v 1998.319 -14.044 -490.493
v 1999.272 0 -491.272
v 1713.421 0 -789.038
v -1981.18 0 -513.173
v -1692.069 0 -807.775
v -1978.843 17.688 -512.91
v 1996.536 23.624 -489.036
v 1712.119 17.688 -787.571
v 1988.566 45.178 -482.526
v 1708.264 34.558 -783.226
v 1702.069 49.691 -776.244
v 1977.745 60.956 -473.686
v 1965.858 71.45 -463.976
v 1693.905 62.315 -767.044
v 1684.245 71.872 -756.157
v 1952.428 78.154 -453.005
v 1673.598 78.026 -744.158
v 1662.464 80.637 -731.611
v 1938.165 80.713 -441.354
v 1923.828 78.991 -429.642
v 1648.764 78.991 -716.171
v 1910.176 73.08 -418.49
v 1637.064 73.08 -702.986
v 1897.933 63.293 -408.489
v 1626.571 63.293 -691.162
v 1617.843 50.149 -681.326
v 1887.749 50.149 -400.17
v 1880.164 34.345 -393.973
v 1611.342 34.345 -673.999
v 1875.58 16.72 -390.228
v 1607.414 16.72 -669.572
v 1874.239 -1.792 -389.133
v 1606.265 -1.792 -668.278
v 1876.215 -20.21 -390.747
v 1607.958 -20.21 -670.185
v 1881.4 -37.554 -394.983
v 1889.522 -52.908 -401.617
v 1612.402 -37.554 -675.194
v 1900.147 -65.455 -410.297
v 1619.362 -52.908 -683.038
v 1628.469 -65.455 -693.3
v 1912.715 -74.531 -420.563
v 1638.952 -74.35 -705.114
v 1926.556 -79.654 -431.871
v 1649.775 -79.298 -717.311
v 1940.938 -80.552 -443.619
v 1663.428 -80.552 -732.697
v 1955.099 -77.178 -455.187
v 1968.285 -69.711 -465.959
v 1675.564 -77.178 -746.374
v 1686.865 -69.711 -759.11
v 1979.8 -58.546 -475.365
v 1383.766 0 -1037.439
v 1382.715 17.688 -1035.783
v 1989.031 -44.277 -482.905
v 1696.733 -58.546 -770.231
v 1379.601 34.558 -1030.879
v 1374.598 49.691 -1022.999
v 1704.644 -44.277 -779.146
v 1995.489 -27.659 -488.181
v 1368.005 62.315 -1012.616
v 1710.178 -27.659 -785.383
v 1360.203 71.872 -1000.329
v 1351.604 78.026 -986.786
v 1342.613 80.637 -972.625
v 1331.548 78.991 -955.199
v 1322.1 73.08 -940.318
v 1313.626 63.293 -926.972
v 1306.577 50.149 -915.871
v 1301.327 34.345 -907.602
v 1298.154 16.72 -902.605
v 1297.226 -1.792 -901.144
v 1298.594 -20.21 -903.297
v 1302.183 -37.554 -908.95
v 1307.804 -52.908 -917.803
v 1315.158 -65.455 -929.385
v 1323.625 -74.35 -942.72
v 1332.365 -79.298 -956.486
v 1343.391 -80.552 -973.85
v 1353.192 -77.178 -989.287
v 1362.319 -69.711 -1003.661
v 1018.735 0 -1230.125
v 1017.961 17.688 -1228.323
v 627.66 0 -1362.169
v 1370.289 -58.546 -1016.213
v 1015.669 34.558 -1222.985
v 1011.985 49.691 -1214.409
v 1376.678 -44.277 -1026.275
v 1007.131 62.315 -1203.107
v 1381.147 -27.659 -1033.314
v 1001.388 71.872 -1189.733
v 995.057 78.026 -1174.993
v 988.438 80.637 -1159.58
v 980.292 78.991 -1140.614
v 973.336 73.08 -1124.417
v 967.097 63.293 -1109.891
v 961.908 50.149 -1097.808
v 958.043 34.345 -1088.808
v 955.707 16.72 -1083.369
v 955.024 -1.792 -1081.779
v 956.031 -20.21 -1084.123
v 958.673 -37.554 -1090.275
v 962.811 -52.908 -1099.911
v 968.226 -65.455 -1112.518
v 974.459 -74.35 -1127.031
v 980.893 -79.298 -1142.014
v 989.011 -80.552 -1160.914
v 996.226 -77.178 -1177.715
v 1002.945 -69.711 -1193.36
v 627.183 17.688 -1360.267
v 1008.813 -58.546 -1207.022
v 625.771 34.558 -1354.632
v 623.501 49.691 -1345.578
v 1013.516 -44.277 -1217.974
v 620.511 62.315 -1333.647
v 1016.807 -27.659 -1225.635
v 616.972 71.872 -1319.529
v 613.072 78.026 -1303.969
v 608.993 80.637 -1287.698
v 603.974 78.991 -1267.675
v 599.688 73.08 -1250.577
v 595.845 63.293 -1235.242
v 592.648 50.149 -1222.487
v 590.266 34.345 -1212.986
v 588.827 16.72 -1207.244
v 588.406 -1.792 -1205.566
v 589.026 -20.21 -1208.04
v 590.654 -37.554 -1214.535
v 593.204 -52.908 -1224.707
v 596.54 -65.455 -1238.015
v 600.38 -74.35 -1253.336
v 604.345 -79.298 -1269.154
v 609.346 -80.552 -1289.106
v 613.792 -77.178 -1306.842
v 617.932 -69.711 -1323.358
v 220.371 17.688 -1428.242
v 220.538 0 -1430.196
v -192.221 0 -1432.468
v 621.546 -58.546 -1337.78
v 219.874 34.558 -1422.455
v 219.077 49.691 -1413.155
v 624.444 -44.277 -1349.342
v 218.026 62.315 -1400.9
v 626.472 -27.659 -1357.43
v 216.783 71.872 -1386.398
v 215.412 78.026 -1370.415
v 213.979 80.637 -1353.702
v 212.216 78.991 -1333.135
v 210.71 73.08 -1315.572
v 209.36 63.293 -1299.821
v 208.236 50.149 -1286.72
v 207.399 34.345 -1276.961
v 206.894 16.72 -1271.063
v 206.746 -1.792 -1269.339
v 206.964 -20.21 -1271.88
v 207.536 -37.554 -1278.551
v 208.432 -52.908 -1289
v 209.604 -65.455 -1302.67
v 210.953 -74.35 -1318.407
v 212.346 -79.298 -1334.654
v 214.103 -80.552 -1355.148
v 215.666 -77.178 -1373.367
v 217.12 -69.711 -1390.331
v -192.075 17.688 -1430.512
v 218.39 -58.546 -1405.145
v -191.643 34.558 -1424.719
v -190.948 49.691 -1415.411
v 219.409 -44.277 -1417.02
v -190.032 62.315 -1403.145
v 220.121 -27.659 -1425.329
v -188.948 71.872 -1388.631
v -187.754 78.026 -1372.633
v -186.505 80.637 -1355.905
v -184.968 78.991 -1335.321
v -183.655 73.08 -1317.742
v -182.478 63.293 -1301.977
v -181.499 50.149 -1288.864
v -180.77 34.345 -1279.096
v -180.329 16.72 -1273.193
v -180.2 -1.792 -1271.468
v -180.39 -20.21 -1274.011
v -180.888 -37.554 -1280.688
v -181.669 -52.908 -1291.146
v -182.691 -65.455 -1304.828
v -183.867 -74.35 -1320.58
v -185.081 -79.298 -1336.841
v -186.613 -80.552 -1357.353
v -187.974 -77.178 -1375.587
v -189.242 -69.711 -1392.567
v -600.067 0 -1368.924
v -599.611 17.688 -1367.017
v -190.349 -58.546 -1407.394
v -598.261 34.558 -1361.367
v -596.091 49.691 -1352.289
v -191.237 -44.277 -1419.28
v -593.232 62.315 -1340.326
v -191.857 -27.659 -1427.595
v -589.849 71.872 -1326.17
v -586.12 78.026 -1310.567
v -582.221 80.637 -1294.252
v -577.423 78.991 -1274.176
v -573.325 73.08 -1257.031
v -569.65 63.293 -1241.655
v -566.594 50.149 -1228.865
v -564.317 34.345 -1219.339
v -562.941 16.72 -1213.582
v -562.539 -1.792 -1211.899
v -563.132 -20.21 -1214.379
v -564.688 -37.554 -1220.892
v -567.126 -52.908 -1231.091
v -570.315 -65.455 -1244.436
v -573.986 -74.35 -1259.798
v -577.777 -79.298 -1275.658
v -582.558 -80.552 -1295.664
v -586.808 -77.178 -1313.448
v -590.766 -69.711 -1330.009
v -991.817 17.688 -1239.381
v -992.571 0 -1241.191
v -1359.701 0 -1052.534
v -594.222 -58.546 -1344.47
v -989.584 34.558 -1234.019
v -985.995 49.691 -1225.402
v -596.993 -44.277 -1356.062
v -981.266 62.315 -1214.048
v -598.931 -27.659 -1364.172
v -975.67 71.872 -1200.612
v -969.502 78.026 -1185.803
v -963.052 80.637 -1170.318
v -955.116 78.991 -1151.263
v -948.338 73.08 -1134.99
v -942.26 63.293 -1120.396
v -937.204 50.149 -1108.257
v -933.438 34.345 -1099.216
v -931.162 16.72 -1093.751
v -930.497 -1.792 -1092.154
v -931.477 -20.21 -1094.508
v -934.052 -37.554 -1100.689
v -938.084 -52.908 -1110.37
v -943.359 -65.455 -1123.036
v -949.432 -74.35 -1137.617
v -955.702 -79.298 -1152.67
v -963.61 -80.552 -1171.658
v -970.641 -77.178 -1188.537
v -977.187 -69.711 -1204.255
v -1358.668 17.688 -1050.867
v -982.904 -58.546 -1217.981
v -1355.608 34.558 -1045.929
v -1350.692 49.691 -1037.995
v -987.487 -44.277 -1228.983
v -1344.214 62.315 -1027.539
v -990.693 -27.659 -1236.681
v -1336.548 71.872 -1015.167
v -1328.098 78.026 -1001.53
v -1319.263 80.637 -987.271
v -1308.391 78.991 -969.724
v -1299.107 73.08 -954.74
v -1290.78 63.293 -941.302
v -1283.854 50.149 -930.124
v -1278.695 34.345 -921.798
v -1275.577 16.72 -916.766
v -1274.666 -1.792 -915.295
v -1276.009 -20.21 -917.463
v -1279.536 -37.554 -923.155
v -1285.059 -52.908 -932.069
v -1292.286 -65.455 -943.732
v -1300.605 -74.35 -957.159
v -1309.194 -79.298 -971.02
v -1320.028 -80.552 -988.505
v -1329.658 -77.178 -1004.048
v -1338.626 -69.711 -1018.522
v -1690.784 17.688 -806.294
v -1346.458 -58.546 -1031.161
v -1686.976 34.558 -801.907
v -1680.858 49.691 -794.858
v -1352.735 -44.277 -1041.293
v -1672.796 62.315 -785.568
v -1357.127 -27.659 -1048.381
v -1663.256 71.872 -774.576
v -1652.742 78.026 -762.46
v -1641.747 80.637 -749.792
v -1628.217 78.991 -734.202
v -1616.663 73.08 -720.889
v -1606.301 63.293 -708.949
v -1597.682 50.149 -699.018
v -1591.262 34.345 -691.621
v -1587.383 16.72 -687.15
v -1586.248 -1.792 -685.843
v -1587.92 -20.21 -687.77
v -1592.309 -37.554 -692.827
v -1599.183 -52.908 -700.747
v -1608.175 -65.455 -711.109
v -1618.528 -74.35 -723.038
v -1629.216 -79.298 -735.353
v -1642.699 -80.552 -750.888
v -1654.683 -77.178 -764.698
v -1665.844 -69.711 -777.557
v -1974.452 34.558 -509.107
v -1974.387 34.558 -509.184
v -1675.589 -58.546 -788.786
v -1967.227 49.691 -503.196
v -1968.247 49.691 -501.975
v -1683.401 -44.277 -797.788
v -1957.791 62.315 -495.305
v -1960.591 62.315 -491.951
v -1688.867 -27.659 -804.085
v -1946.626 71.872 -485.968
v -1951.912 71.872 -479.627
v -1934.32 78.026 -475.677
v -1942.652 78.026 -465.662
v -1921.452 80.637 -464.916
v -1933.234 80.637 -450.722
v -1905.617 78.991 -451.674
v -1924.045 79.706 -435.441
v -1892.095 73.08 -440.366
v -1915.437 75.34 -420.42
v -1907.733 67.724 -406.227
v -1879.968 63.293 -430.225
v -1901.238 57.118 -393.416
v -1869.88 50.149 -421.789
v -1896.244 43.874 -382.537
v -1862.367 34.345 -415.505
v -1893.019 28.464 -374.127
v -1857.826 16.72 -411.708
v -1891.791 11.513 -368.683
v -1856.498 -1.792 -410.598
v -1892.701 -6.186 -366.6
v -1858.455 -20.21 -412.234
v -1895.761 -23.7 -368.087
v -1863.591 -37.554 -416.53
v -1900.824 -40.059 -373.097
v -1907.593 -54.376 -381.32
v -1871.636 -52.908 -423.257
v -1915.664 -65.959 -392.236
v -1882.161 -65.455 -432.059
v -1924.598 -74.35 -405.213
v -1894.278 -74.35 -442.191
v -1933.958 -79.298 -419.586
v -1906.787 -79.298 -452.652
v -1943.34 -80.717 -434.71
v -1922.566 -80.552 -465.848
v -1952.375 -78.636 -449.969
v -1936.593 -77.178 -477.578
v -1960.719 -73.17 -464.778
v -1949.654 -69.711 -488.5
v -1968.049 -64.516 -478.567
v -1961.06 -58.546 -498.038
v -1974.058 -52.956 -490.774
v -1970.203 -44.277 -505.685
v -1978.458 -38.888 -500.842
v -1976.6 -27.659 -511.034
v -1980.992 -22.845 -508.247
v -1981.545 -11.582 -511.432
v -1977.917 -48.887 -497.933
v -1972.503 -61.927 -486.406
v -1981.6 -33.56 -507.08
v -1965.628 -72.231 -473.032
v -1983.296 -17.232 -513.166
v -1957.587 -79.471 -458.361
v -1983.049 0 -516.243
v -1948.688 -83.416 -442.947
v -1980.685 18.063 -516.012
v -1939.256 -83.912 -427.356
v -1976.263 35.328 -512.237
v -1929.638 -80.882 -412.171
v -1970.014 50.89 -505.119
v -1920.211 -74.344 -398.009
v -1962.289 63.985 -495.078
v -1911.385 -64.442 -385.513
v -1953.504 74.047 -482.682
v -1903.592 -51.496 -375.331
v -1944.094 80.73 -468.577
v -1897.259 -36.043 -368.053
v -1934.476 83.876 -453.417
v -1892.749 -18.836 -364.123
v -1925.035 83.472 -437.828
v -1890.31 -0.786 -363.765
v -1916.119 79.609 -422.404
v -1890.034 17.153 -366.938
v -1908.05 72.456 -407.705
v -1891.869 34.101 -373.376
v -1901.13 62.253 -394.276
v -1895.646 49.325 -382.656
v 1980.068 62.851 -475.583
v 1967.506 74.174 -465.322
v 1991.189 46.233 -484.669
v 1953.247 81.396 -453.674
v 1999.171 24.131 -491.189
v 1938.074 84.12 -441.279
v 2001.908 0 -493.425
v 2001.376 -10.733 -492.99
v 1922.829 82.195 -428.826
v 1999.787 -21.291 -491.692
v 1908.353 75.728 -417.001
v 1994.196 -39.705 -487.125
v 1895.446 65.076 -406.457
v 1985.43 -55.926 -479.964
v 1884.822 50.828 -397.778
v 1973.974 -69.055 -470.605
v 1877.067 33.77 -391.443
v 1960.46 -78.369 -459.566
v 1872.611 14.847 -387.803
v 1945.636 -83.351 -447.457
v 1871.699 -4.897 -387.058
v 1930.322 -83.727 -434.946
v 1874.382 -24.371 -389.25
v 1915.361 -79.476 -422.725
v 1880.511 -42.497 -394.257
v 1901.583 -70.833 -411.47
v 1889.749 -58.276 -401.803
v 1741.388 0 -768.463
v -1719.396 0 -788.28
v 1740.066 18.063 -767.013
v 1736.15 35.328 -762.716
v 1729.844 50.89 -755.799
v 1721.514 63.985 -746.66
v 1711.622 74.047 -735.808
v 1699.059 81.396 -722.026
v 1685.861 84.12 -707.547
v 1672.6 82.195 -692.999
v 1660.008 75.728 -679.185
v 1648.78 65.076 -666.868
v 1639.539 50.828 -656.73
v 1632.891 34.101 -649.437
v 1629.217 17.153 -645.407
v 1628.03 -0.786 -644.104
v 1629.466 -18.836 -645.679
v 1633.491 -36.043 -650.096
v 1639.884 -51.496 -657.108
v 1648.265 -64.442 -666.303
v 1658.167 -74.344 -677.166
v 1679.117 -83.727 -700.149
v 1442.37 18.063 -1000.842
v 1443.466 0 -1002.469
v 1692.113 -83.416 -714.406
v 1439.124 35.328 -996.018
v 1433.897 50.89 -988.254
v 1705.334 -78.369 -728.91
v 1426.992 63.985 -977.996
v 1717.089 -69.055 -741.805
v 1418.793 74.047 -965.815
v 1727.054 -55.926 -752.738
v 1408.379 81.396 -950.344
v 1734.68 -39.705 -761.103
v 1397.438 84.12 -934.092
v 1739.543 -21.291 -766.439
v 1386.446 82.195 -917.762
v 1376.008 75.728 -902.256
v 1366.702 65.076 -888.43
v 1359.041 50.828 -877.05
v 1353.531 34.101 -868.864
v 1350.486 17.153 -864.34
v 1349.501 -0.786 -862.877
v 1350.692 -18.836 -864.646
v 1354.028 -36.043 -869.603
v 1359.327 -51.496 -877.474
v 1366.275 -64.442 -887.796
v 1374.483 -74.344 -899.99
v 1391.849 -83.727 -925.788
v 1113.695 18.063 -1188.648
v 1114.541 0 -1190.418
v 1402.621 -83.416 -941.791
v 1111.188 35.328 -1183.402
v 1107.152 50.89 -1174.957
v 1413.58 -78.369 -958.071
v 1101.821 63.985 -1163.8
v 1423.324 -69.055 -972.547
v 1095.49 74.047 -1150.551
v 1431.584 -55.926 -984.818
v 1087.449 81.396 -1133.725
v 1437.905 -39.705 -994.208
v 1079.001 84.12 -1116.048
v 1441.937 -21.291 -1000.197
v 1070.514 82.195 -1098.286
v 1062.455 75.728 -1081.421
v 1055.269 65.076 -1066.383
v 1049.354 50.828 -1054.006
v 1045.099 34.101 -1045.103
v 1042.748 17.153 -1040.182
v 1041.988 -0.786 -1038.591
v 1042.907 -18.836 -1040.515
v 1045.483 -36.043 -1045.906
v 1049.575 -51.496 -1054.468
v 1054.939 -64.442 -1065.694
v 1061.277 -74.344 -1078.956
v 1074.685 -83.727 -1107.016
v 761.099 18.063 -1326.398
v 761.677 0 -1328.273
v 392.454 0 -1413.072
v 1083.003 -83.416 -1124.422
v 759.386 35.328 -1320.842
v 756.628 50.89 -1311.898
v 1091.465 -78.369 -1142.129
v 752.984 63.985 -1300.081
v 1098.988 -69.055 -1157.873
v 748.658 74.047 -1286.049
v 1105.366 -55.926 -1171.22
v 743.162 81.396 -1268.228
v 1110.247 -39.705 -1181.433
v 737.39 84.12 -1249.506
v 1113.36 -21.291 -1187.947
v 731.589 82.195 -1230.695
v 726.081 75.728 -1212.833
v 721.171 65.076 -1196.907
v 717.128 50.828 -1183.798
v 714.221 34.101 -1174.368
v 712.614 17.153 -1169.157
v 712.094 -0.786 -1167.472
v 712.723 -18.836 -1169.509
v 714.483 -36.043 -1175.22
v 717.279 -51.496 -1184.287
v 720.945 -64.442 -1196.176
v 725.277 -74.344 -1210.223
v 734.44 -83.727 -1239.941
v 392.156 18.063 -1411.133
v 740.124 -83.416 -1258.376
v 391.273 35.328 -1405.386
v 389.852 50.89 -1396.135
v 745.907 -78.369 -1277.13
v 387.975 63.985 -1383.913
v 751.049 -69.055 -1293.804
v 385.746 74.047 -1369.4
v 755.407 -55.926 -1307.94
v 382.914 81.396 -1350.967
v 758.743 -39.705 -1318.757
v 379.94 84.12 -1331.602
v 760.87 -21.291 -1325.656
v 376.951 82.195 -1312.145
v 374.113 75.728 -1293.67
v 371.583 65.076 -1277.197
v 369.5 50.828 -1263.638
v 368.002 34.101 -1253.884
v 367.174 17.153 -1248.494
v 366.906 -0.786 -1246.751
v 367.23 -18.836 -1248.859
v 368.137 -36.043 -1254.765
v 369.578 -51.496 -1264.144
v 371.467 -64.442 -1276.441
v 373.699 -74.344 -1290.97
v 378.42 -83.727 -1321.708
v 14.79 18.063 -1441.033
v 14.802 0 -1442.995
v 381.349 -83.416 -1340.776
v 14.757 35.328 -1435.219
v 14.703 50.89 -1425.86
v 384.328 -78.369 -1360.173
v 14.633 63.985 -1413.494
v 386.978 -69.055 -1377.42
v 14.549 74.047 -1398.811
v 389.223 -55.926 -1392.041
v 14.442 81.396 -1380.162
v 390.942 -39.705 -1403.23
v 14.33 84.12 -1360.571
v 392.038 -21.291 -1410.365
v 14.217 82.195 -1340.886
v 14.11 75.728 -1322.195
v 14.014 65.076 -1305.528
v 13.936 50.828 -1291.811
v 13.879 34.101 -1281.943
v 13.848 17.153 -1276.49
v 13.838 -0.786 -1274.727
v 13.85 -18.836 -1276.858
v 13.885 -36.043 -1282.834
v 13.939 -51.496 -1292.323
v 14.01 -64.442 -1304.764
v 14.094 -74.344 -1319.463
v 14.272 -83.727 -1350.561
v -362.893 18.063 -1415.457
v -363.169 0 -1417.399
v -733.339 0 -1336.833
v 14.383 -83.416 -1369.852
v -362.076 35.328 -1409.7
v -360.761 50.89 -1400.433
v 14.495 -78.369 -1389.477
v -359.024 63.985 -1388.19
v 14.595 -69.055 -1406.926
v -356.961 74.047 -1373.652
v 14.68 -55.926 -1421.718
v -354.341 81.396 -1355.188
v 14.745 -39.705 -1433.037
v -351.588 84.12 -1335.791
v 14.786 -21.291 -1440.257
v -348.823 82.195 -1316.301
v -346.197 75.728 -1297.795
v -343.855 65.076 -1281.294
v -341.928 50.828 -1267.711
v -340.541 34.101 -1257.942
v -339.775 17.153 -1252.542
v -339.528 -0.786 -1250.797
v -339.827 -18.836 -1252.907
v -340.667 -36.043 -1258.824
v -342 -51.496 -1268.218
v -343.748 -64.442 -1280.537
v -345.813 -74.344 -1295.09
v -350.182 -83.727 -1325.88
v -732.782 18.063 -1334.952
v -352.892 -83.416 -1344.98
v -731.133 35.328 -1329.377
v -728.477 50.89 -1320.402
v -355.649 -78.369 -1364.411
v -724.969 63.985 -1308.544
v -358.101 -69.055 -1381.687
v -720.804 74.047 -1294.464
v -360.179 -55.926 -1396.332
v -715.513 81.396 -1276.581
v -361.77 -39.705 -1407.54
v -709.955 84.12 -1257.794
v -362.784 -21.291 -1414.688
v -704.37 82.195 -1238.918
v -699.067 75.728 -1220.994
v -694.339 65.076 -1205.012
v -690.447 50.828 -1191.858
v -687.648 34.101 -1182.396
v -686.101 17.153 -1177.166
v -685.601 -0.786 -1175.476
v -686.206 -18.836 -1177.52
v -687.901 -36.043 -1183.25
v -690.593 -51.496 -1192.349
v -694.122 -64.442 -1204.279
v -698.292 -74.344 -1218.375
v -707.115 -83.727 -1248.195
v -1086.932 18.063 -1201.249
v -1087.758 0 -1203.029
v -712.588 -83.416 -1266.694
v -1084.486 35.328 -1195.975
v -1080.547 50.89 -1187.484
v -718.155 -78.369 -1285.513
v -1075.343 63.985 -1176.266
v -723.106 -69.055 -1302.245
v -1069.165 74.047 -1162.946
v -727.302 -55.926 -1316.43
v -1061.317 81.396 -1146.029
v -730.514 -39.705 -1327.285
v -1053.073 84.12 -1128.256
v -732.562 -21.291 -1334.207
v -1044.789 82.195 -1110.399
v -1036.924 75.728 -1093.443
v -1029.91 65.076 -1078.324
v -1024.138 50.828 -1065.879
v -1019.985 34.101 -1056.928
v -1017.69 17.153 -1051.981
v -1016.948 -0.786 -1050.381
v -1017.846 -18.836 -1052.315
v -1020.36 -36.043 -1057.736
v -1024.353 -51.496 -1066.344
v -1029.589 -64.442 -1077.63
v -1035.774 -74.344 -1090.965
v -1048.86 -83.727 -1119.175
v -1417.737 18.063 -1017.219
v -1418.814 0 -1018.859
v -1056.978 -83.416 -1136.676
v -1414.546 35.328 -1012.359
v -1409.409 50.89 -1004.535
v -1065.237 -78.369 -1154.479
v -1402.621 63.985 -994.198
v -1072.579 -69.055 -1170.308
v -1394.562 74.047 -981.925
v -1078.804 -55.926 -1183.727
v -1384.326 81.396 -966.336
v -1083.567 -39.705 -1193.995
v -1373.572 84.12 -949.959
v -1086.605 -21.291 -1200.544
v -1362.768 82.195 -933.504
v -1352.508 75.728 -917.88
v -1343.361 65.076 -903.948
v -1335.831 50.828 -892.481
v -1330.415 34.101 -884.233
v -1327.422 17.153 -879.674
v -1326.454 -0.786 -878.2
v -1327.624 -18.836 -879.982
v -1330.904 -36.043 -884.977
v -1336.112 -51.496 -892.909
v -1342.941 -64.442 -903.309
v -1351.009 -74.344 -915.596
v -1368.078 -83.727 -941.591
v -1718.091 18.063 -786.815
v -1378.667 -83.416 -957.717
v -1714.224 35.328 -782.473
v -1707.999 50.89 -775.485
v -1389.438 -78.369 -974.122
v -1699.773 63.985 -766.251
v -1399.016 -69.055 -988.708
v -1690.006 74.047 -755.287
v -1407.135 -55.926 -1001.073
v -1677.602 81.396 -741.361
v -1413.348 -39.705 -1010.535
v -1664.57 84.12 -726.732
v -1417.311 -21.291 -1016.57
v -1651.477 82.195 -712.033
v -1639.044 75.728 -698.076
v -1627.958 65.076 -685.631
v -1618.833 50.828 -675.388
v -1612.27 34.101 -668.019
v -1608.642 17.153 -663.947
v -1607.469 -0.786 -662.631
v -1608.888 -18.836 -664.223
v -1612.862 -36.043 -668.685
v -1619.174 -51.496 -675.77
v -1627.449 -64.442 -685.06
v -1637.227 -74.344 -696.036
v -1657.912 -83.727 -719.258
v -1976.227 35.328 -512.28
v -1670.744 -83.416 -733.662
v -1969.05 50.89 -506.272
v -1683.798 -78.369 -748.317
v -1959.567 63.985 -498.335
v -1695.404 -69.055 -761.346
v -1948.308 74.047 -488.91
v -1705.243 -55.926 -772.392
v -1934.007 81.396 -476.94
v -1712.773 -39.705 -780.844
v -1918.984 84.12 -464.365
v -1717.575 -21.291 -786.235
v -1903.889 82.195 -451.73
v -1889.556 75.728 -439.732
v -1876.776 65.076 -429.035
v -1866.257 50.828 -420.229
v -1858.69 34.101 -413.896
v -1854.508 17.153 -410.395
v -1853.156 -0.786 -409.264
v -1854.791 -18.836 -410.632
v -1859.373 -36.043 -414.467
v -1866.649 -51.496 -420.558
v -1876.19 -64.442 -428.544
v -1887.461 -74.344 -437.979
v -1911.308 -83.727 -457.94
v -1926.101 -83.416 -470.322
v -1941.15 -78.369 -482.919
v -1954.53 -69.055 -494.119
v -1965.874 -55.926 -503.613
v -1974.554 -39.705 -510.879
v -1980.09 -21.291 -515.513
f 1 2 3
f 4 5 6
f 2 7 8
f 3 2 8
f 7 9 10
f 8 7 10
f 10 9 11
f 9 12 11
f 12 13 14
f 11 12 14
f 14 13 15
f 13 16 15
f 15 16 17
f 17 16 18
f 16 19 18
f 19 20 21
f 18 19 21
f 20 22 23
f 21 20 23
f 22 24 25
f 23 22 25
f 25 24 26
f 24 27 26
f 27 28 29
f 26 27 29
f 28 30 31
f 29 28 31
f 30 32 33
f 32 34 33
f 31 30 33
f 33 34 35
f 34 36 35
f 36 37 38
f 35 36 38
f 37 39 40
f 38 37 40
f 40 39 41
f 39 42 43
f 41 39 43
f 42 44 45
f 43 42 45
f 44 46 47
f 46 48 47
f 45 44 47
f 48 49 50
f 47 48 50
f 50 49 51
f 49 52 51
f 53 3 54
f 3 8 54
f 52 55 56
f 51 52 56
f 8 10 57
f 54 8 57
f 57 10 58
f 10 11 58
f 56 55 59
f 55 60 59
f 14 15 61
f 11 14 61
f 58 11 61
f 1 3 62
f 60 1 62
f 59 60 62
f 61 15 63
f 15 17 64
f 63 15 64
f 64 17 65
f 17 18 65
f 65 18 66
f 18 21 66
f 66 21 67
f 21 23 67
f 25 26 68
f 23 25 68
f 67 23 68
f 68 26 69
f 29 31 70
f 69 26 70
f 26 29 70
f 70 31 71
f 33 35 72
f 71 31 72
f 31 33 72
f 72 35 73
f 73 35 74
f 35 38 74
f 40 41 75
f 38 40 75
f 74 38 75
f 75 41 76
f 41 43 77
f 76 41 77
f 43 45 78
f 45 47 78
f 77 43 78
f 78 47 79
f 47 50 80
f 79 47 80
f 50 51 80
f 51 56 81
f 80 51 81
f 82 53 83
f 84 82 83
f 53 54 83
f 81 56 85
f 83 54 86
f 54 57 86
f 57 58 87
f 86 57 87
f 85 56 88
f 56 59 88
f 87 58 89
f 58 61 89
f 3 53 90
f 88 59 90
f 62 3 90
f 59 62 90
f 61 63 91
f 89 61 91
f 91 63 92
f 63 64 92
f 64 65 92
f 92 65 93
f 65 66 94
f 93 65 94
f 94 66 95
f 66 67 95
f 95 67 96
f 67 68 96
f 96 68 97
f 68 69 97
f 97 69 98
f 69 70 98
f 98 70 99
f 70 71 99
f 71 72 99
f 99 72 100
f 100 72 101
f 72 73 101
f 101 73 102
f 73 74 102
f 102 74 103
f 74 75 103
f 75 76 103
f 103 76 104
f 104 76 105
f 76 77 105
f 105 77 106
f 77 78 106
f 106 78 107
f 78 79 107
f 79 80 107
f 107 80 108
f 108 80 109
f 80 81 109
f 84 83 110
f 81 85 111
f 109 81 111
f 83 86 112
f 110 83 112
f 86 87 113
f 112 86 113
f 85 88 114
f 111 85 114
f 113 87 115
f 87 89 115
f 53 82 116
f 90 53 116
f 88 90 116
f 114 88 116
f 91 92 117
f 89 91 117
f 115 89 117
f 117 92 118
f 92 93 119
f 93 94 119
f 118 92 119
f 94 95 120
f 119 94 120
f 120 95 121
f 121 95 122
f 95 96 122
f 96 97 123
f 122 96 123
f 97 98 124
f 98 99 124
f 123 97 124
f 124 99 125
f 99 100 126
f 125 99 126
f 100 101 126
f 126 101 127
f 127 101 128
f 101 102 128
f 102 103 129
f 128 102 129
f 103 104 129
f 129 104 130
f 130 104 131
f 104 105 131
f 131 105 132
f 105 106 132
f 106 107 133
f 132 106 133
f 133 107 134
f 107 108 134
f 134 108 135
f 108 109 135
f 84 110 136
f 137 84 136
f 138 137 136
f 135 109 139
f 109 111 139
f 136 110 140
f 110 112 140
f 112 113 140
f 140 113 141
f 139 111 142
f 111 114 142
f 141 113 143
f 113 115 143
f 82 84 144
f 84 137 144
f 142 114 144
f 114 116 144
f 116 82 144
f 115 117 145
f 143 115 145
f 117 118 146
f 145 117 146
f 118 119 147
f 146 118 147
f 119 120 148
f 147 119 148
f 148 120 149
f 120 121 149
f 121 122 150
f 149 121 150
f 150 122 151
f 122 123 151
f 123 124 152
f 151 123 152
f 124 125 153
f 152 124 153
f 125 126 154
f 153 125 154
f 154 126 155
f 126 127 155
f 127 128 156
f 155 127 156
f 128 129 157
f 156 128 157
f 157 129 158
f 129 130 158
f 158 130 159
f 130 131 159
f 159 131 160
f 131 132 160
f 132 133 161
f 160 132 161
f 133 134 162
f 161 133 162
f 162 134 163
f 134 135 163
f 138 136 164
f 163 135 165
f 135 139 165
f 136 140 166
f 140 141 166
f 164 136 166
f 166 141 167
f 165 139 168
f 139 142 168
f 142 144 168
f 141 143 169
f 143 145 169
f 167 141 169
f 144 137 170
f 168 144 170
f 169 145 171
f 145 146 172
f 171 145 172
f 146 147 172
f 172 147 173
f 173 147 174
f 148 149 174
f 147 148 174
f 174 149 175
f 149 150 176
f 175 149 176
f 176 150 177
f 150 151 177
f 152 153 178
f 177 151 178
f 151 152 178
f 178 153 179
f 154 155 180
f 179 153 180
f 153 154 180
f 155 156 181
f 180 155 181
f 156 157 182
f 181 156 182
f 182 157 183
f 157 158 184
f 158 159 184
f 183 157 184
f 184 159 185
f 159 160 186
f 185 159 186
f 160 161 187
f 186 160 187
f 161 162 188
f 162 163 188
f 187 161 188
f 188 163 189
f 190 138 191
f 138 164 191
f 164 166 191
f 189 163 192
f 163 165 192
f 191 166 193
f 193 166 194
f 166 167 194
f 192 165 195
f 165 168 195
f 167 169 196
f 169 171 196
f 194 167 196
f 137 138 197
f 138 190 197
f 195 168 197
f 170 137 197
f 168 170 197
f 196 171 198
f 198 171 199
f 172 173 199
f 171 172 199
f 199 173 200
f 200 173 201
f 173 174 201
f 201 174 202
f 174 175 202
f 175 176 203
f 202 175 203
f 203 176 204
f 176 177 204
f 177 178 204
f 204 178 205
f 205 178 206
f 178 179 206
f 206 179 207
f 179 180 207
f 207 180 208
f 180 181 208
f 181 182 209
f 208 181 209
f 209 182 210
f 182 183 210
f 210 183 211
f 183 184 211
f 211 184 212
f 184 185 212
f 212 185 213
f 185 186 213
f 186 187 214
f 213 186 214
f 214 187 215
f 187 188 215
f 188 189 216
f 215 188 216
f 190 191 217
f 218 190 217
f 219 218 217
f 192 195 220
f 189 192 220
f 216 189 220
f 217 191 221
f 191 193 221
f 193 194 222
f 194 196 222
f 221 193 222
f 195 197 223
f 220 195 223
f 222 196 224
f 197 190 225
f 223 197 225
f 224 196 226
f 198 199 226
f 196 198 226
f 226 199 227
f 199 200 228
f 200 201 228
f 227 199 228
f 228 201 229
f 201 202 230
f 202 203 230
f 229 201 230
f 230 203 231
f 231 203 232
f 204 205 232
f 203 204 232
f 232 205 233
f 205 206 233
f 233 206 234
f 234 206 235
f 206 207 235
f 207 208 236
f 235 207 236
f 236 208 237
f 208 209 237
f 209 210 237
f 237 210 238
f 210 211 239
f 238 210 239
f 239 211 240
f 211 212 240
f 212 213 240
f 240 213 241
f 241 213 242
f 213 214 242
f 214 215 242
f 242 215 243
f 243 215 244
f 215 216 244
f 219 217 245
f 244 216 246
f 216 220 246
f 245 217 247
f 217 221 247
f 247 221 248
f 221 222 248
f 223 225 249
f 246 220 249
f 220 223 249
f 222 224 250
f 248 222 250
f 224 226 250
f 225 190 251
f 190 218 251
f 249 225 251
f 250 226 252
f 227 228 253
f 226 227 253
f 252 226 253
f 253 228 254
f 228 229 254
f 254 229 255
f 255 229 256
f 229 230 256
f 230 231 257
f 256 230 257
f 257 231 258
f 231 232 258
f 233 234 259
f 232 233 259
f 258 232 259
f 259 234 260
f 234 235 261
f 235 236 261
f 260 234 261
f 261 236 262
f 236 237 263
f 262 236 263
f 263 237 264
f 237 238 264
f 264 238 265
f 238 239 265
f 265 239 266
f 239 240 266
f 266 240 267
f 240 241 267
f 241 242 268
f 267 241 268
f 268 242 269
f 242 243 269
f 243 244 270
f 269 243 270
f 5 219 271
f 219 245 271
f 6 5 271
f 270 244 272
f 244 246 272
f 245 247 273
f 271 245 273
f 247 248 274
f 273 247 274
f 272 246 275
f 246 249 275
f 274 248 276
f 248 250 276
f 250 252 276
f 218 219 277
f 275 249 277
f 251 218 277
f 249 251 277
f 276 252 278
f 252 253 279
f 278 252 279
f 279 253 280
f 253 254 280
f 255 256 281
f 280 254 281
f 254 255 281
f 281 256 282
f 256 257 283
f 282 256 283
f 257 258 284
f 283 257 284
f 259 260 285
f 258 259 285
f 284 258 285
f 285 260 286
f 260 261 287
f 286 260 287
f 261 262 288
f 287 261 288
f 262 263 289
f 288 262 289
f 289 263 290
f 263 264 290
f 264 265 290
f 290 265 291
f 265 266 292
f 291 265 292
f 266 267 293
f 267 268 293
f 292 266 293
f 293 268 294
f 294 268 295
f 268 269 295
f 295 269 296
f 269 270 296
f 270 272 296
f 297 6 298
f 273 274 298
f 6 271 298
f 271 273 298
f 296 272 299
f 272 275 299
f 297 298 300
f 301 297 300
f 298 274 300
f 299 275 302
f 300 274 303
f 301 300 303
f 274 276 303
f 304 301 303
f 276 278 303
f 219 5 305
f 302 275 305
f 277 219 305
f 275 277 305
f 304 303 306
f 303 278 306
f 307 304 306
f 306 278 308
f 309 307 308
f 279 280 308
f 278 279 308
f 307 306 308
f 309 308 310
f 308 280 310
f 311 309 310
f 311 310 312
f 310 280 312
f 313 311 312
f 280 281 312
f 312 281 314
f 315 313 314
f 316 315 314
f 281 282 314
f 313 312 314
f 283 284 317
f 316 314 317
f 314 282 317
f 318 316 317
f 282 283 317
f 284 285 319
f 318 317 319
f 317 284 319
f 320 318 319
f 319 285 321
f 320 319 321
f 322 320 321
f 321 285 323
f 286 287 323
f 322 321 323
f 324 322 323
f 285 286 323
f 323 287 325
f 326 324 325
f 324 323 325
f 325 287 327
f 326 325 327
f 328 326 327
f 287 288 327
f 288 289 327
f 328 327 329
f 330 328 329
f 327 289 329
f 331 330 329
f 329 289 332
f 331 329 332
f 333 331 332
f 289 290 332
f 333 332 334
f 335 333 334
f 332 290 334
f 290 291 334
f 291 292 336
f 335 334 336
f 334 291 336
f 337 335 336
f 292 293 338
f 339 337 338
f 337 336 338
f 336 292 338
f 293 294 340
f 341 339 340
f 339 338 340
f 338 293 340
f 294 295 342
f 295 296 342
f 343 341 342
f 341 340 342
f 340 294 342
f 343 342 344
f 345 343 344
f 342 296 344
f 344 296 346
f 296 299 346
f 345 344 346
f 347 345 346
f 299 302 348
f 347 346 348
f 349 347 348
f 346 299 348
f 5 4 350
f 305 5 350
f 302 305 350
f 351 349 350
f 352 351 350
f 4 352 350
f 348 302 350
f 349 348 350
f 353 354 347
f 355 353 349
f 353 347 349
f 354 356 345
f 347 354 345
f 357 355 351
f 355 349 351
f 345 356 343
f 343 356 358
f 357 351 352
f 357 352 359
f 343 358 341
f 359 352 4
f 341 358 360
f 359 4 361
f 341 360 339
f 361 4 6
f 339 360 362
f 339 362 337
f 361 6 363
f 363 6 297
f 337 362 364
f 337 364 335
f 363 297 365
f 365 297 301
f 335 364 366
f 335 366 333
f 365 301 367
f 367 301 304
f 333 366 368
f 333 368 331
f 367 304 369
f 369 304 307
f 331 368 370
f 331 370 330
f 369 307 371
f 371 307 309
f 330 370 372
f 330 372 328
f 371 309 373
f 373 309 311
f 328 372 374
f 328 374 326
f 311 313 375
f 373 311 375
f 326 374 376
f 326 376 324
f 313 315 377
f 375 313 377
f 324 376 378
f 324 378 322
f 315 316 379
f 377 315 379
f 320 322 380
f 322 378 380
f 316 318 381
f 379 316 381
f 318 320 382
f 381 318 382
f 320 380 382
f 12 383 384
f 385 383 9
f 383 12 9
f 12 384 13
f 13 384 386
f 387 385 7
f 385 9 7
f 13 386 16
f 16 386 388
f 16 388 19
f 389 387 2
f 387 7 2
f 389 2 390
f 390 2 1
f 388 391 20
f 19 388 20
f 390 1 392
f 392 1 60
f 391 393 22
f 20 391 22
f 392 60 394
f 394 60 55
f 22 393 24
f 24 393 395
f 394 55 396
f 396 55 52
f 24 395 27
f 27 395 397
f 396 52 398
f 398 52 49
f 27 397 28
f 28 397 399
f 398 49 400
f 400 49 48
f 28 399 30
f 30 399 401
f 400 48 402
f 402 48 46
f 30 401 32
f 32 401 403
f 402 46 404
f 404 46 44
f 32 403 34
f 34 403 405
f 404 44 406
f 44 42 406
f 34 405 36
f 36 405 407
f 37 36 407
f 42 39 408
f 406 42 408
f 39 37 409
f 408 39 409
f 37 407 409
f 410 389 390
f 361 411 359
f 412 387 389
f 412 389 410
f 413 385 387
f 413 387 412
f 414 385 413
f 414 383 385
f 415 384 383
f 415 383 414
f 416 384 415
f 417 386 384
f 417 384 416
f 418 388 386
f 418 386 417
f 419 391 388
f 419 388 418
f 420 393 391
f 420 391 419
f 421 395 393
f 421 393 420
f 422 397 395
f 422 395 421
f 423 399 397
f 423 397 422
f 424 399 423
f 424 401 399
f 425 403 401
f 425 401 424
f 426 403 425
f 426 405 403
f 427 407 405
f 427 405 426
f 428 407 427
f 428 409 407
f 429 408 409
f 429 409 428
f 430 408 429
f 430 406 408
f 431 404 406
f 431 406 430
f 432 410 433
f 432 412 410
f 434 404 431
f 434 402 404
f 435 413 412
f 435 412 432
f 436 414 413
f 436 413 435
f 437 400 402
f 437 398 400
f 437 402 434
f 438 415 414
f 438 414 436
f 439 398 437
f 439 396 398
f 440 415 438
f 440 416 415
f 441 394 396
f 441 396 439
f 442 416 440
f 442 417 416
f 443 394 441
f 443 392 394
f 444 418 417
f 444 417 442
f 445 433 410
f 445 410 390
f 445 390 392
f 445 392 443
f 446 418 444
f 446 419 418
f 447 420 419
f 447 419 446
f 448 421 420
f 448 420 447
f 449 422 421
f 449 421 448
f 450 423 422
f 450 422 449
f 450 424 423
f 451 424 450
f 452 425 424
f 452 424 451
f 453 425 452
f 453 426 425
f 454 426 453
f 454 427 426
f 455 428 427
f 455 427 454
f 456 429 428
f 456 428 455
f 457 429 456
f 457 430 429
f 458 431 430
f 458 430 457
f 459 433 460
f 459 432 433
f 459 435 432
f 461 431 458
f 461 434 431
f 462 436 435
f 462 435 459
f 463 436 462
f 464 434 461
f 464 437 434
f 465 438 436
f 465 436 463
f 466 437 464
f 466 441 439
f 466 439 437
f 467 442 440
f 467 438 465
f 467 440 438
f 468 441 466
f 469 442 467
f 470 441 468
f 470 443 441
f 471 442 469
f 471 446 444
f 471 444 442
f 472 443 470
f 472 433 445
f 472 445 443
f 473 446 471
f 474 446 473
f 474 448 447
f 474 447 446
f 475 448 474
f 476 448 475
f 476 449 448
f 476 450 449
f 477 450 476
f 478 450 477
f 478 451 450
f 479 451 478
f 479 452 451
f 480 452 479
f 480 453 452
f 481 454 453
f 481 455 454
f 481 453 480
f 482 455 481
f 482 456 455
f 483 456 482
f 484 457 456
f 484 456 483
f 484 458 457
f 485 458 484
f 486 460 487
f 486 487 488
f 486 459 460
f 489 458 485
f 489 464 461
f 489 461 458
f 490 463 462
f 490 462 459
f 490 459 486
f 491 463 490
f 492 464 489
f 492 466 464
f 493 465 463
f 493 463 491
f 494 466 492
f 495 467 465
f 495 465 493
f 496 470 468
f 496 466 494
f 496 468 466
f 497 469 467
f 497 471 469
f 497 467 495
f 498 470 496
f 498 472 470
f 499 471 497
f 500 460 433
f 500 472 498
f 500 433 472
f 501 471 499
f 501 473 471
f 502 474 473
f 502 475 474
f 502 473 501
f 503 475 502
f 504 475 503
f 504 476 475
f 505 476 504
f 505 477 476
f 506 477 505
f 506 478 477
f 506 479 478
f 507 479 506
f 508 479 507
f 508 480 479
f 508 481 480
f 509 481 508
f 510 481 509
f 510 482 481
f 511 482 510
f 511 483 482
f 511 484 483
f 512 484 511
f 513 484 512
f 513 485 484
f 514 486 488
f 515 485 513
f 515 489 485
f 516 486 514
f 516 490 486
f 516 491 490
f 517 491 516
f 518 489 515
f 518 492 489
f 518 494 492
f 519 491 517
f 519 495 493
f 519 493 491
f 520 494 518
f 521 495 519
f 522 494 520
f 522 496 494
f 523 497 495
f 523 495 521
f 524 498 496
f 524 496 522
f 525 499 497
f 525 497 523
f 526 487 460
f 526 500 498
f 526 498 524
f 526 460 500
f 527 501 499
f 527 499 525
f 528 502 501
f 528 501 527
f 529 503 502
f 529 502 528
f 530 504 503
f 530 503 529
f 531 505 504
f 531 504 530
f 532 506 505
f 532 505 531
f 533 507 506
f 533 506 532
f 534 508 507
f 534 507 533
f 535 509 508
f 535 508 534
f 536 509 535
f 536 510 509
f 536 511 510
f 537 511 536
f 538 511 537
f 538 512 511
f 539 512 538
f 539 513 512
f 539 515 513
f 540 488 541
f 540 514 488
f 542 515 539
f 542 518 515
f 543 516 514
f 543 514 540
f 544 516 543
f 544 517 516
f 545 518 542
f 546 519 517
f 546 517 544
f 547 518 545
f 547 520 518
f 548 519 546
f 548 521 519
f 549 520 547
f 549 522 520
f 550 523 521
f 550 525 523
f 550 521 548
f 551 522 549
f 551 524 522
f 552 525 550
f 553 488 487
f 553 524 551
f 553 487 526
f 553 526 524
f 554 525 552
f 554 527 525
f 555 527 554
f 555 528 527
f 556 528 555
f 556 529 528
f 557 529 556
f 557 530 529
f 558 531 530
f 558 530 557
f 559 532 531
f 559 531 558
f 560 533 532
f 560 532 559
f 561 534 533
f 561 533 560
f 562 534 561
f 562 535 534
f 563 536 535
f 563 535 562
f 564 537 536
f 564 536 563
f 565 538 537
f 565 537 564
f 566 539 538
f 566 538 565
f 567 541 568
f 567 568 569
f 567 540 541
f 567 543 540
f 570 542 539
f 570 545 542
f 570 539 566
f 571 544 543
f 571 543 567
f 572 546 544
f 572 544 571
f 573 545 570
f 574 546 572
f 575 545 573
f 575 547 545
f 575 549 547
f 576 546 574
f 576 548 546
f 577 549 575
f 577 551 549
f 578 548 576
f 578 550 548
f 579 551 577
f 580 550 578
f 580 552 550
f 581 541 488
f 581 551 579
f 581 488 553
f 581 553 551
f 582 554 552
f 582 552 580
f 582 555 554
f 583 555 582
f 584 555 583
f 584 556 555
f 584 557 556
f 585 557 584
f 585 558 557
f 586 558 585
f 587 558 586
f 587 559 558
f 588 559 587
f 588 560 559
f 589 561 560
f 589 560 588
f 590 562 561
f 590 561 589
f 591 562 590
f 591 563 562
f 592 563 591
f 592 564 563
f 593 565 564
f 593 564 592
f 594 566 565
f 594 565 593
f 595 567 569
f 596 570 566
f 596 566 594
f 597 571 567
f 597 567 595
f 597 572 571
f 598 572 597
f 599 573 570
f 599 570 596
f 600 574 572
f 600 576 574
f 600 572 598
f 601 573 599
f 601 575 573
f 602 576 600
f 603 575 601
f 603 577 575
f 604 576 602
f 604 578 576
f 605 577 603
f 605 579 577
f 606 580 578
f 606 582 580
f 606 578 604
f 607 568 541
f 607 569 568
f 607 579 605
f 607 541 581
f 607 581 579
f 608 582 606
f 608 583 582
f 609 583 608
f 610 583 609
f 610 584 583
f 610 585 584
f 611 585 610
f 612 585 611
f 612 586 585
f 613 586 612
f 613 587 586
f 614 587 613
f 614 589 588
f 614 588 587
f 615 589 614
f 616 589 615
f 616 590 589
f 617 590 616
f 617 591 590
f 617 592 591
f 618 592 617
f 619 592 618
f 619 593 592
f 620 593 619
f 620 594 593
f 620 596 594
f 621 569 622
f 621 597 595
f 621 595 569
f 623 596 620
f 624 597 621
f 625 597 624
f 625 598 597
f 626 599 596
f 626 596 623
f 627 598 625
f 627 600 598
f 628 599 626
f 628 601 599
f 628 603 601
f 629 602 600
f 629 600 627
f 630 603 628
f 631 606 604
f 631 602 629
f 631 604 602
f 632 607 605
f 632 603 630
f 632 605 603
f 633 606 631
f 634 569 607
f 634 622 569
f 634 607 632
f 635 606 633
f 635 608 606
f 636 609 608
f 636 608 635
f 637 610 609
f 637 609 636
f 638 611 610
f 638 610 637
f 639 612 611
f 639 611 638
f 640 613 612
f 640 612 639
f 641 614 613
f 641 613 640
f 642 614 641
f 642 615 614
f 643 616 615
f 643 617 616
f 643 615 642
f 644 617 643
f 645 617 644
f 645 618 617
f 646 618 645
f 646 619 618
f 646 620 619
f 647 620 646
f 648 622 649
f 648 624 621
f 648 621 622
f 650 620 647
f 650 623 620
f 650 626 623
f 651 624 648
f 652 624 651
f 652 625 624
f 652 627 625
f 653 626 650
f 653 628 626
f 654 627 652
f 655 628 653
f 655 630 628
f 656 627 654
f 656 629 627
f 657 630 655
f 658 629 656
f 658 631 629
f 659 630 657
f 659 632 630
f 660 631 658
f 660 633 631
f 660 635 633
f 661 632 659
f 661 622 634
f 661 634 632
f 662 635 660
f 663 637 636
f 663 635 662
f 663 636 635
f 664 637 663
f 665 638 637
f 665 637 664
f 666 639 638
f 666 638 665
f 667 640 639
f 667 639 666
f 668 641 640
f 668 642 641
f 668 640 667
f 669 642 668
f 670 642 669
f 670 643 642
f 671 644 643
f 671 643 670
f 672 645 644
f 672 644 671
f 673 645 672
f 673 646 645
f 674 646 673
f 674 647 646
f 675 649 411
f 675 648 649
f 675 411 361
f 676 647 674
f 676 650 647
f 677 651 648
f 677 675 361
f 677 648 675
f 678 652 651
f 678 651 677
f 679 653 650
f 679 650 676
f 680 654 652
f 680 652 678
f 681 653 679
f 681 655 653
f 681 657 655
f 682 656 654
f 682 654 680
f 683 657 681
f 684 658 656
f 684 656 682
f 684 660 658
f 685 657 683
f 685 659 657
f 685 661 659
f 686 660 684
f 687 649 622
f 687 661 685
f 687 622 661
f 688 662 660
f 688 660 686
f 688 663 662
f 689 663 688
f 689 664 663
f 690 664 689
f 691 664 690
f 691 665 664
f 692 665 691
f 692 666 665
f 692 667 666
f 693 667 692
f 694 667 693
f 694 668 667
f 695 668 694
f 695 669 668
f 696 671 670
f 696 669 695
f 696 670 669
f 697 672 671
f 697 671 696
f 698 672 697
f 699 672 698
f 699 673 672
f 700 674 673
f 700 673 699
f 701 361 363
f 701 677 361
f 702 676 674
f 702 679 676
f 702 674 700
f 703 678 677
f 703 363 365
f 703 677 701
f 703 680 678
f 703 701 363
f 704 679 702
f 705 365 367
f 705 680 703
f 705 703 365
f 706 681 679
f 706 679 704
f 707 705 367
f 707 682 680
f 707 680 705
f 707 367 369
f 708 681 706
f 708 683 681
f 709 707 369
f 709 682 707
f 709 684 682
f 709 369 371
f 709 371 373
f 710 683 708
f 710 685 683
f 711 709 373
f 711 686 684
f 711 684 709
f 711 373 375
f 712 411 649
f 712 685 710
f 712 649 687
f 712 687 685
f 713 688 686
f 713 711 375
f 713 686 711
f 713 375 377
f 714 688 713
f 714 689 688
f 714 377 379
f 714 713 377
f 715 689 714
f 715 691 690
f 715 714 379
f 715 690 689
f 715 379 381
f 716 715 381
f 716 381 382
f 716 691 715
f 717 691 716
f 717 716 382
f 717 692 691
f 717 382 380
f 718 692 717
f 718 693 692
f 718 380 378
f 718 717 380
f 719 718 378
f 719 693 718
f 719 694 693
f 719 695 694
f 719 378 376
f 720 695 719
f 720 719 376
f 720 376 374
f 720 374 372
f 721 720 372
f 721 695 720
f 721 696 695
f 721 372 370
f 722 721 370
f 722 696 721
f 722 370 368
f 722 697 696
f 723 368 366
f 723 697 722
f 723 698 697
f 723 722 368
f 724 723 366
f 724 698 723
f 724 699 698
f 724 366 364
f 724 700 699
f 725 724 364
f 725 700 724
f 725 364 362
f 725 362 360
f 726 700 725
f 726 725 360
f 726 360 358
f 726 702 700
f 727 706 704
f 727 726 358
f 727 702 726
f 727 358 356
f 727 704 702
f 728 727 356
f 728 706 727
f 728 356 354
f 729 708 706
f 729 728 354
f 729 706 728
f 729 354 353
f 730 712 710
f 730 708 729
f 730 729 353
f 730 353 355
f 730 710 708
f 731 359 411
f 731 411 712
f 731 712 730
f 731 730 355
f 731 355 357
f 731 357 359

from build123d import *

# Parameters (mm, degrees)
TUBE_OUTLINE_R   = 84.1375
TUBE_OUTLINE_R_2 = 80.7339
TUBE_ANGLE       = 125.66203


# Read off the part's stored shape, not the designer's step: tube
with BuildPart() as part:
    # tube outline → tube (revolve)
    with BuildSketch(Plane(origin=(0, 0, 1141.911607404), x_dir=(0.8896636769492224, 0, -0.4566164056592685), z_dir=(0.4566164056592685, 0, 0.8896636769492224))):
        with Locations((2500.811607404, 0)):
            Circle(TUBE_OUTLINE_R)
        with Locations((2500.811607404, 0)):
            Circle(TUBE_OUTLINE_R_2, mode=Mode.SUBTRACT)
    revolve(axis=Axis((0, 0, 1141.911607404), (0, 1, 0)), revolution_arc=TUBE_ANGLE)

    # right_trim
    split(bisect_by=Plane(origin=(559.473821641, 0, 684.883731267), x_dir=(0, -1, 0), z_dir=(-0.632637748, 0, -0.774447855)), keep=Keep.TOP)

    # pipe4-trim
    split(bisect_by=Plane(origin=(-1204.136873732, 148.172068381, 733.134555259), x_dir=(0.122131336, 0.992513948, 0), z_dir=(0.849462239, -0.104528463, -0.517192135)), keep=Keep.TOP)


solid = part.part
